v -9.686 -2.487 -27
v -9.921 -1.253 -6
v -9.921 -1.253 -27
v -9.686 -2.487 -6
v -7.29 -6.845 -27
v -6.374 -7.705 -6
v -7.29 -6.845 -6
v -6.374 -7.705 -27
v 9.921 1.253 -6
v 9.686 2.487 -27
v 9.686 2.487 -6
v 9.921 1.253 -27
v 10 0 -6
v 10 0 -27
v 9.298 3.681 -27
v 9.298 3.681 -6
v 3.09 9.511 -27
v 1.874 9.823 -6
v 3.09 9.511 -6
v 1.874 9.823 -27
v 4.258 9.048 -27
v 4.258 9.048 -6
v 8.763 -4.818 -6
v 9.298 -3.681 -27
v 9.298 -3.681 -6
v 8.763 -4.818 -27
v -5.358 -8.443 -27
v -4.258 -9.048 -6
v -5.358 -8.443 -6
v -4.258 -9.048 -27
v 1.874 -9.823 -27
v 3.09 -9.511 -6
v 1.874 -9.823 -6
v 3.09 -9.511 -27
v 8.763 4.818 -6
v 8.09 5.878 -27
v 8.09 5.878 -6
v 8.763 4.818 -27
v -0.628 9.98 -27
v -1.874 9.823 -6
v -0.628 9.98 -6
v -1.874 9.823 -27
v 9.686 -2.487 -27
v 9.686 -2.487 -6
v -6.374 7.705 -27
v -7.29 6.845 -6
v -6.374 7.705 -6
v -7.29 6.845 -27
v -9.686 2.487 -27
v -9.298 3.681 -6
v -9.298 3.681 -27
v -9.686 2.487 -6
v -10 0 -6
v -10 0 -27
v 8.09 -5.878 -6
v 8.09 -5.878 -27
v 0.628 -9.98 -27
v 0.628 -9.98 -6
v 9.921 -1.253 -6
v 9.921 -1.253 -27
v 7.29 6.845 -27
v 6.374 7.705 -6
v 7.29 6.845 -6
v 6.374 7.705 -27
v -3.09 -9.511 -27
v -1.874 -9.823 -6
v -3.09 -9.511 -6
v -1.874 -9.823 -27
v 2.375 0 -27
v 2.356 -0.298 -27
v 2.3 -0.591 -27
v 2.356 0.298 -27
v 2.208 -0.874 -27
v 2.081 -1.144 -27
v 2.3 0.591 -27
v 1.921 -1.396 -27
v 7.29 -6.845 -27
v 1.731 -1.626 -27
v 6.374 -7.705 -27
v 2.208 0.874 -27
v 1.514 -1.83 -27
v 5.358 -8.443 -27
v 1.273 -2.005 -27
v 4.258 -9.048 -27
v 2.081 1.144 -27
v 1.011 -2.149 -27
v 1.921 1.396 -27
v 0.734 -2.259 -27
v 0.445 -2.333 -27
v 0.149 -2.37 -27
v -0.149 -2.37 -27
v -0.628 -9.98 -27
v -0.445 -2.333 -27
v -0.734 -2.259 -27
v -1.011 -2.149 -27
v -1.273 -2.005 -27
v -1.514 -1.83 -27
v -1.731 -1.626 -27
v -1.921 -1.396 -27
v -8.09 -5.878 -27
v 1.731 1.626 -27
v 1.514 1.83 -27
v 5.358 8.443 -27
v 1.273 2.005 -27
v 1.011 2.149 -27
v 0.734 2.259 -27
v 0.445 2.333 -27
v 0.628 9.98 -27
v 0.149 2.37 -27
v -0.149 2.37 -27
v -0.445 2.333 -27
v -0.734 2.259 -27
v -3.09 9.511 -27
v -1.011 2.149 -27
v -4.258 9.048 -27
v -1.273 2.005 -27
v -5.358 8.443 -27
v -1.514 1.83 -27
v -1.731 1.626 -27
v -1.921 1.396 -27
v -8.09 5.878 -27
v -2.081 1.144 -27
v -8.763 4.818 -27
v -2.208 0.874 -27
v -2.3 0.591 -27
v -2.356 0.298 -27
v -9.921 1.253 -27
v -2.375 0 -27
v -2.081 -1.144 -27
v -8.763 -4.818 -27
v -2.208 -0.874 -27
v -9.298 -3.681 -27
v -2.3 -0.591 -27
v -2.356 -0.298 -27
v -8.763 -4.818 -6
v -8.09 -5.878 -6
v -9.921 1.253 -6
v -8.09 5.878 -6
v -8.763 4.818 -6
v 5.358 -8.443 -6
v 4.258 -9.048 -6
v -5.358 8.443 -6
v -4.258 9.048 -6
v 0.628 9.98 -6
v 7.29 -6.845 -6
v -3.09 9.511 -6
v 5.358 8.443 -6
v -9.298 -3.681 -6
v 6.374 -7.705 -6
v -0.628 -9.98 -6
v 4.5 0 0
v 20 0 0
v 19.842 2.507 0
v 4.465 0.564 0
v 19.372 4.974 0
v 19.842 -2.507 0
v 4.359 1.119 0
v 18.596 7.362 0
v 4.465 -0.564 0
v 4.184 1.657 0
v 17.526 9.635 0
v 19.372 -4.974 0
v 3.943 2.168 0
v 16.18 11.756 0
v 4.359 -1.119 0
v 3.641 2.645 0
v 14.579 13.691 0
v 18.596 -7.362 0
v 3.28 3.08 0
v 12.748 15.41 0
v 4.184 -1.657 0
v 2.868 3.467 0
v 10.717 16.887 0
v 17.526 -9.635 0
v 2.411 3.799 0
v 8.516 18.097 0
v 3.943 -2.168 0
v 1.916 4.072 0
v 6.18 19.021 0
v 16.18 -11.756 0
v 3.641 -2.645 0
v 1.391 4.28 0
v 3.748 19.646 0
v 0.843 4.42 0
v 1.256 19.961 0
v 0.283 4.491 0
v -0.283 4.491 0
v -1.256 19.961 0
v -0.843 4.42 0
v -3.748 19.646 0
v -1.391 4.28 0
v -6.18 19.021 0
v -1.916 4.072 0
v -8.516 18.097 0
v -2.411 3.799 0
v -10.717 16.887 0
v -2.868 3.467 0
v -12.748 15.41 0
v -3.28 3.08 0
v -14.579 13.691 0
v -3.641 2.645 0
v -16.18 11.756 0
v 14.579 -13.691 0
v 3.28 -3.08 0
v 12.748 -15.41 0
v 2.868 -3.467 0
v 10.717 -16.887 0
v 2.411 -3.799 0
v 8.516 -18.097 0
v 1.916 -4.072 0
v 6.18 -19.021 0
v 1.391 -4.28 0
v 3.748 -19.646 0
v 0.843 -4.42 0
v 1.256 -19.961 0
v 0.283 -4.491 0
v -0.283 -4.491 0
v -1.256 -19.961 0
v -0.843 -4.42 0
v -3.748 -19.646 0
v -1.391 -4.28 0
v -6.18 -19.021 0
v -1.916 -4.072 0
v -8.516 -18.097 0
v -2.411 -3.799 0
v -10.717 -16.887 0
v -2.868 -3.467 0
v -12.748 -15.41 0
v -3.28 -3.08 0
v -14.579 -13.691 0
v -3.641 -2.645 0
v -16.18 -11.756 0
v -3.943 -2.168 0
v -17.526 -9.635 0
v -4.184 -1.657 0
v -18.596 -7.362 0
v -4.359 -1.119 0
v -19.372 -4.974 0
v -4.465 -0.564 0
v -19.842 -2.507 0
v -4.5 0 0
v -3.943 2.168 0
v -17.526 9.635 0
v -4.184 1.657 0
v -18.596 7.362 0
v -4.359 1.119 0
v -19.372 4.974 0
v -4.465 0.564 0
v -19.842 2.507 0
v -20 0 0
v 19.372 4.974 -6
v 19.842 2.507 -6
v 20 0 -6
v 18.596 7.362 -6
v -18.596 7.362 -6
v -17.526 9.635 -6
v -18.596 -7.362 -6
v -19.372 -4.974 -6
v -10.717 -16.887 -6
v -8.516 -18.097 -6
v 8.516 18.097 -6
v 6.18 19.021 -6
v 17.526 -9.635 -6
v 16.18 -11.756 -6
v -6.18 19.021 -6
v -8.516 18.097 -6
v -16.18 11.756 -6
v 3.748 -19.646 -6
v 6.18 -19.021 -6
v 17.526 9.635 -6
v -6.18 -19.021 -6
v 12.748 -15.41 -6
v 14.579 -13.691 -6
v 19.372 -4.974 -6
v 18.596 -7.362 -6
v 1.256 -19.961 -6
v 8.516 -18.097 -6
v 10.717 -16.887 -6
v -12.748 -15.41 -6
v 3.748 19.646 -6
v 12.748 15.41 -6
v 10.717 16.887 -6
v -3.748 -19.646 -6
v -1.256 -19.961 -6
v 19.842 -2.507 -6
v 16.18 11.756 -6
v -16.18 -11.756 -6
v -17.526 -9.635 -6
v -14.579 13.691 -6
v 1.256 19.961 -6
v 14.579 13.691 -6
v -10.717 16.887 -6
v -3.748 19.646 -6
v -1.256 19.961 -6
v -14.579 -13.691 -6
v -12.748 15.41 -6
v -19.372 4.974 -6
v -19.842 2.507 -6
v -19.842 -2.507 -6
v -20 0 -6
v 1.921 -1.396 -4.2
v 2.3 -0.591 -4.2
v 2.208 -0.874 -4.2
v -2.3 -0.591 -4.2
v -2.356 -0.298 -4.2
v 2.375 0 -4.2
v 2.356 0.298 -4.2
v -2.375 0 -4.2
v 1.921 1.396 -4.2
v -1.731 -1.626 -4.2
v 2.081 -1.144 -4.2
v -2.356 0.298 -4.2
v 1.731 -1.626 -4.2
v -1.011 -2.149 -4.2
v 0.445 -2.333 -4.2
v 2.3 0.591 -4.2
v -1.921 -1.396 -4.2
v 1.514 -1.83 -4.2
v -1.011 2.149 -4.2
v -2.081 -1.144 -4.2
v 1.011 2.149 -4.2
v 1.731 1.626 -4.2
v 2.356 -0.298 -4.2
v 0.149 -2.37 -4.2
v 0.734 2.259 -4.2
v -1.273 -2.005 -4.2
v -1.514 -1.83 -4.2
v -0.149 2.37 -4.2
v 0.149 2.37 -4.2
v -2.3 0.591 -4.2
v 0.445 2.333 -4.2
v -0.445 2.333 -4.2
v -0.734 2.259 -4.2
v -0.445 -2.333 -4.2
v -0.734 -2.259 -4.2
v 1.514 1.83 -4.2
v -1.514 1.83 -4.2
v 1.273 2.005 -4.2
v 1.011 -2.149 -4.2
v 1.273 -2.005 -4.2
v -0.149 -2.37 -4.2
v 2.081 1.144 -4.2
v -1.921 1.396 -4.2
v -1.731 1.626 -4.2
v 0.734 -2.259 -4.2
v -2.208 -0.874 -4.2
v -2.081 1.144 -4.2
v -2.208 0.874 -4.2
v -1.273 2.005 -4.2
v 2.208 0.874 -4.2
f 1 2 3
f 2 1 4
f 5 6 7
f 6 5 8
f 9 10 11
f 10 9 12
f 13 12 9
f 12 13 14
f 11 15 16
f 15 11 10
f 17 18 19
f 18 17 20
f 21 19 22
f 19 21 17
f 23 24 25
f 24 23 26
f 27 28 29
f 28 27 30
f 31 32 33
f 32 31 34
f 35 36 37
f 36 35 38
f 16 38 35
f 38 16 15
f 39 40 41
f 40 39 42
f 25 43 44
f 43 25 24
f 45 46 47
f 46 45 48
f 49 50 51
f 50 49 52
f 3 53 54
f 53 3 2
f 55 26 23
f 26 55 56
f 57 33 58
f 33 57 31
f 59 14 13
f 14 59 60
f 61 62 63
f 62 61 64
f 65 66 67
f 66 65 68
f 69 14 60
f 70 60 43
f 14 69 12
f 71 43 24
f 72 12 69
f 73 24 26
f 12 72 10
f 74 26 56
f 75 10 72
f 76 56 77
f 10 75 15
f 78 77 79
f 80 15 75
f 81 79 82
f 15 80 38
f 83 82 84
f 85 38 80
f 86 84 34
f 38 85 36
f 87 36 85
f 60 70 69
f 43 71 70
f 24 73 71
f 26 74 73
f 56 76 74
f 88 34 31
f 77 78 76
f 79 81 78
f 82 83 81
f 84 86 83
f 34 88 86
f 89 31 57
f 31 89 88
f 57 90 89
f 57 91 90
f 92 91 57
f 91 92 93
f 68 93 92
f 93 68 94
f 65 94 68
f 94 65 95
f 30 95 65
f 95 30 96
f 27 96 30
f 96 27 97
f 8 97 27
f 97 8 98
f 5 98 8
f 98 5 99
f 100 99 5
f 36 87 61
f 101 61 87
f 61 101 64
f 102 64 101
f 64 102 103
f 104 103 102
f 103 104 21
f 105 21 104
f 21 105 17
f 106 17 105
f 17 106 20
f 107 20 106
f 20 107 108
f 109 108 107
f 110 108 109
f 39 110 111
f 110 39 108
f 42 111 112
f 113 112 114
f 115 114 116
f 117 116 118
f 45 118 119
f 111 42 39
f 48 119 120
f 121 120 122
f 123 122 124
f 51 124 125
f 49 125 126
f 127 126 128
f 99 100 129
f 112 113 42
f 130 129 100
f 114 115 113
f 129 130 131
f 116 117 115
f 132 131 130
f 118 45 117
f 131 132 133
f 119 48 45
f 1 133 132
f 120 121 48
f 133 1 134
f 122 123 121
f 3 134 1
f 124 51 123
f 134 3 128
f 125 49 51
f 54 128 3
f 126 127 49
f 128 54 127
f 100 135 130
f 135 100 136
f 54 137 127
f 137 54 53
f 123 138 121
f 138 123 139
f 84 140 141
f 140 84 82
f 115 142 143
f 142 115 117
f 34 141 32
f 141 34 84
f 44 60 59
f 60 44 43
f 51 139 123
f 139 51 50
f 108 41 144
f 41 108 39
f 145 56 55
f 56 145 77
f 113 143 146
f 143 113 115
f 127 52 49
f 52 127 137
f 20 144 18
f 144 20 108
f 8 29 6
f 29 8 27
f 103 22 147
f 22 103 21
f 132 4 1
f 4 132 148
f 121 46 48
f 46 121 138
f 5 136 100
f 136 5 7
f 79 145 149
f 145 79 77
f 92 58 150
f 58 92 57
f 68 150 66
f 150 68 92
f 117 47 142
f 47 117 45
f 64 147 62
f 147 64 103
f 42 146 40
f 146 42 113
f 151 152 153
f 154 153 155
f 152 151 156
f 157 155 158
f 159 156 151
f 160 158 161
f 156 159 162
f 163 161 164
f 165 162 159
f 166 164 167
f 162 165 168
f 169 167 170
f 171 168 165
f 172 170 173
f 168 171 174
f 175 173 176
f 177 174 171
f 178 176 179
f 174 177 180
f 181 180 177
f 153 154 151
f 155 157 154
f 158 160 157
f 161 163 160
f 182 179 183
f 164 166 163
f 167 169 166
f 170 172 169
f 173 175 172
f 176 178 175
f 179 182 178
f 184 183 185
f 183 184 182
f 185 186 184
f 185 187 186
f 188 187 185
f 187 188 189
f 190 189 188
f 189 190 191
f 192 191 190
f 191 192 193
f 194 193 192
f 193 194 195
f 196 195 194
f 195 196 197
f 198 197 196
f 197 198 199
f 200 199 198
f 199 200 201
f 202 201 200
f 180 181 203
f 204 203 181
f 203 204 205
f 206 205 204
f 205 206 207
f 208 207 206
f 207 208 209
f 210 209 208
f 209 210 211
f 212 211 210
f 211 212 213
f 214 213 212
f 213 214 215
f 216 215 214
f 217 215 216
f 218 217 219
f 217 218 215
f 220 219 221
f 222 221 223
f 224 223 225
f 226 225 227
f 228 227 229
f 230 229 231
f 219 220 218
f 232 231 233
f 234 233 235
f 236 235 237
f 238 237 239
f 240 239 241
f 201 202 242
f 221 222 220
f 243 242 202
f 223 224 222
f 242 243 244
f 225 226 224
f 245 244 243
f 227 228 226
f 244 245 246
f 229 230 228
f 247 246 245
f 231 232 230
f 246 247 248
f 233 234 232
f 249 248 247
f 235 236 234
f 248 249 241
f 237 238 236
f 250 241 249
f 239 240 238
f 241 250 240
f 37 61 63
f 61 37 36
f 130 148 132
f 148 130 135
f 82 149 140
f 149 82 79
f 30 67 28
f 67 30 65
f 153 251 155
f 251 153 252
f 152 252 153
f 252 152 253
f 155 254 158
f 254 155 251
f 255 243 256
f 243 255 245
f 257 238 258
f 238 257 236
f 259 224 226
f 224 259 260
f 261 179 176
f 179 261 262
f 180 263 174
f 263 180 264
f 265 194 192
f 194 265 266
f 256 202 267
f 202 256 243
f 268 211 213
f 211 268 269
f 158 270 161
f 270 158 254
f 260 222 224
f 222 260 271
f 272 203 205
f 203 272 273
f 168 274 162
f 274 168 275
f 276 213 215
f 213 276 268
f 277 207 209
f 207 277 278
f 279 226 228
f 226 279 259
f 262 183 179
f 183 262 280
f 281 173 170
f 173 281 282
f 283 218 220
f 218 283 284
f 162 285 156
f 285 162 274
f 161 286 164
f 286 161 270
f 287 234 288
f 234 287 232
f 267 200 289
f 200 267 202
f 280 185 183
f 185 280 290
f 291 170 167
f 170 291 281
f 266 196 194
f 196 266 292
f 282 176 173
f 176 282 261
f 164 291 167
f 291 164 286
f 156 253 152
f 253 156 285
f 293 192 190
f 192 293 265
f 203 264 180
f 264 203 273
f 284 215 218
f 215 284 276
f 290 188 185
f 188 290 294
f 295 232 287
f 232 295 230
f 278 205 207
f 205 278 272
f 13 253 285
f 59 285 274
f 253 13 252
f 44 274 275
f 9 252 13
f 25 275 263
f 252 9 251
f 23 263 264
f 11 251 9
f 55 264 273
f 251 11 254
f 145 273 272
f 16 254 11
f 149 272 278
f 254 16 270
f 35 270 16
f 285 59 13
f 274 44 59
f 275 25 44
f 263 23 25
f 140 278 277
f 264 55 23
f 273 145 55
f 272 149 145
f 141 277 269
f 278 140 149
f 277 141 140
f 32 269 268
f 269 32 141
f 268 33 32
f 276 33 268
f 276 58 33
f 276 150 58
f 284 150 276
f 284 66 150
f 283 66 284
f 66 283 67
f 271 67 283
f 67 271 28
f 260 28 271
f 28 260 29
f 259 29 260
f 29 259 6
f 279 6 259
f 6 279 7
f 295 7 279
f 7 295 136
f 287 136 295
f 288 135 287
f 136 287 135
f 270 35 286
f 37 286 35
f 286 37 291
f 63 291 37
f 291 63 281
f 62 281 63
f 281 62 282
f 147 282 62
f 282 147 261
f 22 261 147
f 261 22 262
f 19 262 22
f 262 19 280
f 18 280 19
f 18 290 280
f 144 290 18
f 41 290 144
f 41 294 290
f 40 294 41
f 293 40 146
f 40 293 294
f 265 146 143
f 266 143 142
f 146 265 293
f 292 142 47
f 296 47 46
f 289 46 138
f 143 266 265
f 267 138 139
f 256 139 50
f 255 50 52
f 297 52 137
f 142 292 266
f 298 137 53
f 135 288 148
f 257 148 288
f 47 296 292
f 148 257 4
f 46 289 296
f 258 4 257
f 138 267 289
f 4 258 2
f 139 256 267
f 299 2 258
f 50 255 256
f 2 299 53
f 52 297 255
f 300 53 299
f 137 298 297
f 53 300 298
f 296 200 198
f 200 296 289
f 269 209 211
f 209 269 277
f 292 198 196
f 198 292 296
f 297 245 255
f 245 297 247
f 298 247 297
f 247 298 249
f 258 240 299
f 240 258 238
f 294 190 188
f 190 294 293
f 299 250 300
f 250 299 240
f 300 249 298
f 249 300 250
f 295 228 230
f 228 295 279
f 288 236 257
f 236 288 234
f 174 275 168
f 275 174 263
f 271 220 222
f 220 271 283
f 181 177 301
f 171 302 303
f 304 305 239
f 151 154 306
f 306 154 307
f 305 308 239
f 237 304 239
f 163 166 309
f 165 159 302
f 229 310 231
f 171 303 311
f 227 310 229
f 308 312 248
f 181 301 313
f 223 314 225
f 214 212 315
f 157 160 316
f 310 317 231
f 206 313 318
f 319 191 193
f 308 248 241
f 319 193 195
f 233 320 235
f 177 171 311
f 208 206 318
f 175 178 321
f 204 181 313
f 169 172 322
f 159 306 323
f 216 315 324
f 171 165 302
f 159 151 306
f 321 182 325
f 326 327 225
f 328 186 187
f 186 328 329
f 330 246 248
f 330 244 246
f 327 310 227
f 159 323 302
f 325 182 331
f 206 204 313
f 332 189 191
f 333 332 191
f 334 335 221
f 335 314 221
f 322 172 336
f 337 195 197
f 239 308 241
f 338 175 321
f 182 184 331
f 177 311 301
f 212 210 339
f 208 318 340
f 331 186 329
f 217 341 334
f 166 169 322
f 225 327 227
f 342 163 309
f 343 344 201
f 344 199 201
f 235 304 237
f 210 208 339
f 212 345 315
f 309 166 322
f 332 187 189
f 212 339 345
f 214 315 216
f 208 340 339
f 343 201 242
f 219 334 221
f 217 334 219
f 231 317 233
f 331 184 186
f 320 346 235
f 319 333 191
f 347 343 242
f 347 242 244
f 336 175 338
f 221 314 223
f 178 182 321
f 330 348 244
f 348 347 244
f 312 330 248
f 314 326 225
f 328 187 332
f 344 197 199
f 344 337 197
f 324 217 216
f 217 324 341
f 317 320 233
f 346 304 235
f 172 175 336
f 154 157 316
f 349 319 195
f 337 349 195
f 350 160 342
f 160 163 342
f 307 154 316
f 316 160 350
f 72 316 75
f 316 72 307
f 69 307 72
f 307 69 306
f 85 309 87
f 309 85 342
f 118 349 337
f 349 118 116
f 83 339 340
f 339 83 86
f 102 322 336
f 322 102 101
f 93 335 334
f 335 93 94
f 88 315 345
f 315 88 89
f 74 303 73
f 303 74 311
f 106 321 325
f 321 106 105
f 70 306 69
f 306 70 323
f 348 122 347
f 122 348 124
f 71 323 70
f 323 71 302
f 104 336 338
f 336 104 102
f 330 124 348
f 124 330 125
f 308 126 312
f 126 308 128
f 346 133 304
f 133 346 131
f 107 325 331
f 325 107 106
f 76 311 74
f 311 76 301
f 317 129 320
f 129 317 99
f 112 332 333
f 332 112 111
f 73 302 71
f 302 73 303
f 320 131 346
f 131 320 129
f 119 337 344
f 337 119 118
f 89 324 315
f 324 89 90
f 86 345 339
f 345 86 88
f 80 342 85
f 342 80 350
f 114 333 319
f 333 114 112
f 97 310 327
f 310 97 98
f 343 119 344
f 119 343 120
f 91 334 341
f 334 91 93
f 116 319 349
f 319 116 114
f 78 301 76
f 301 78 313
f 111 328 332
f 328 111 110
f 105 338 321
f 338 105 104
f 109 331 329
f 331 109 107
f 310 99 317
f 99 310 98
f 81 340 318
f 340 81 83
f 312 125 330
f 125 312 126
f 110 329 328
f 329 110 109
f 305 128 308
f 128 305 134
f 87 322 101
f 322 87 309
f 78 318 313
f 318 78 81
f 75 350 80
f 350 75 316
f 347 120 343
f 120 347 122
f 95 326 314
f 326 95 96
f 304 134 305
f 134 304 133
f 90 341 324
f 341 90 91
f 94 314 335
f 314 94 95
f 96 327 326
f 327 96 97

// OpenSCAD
$fn = 50;


difference() {
	union() {
		translate(v = [0, 0, -27.0000000000]) {
			cylinder(h = 27, r = 10.0000000000);
		}
		translate(v = [0, 0, -6.0000000000]) {
			cylinder(h = 6, r = 20.0000000000);
		}
	}
	union() {
		translate(v = [0, 0, 0]) {
			rotate(a = [0, 0, 0]) {
				difference() {
					union() {
						#translate(v = [0, 0, -27.0000000000]) {
							cylinder(h = 27, r = 2.2500000000);
						}
						#translate(v = [0, 0, -4.2000000000]) {
							cylinder(h = 4.2000000000, r = 10.0000000000, r1 = 2.3750000000, r2 = 4.5000000000);
						}
						#translate(v = [0, 0, -27.0000000000]) {
							cylinder(h = 27, r = 2.3750000000);
						}
						#translate(v = [0, 0, -27.0000000000]) {
							cylinder(h = 27, r = 2.2500000000);
						}
					}
					union();
				}
			}
		}
	}
}
